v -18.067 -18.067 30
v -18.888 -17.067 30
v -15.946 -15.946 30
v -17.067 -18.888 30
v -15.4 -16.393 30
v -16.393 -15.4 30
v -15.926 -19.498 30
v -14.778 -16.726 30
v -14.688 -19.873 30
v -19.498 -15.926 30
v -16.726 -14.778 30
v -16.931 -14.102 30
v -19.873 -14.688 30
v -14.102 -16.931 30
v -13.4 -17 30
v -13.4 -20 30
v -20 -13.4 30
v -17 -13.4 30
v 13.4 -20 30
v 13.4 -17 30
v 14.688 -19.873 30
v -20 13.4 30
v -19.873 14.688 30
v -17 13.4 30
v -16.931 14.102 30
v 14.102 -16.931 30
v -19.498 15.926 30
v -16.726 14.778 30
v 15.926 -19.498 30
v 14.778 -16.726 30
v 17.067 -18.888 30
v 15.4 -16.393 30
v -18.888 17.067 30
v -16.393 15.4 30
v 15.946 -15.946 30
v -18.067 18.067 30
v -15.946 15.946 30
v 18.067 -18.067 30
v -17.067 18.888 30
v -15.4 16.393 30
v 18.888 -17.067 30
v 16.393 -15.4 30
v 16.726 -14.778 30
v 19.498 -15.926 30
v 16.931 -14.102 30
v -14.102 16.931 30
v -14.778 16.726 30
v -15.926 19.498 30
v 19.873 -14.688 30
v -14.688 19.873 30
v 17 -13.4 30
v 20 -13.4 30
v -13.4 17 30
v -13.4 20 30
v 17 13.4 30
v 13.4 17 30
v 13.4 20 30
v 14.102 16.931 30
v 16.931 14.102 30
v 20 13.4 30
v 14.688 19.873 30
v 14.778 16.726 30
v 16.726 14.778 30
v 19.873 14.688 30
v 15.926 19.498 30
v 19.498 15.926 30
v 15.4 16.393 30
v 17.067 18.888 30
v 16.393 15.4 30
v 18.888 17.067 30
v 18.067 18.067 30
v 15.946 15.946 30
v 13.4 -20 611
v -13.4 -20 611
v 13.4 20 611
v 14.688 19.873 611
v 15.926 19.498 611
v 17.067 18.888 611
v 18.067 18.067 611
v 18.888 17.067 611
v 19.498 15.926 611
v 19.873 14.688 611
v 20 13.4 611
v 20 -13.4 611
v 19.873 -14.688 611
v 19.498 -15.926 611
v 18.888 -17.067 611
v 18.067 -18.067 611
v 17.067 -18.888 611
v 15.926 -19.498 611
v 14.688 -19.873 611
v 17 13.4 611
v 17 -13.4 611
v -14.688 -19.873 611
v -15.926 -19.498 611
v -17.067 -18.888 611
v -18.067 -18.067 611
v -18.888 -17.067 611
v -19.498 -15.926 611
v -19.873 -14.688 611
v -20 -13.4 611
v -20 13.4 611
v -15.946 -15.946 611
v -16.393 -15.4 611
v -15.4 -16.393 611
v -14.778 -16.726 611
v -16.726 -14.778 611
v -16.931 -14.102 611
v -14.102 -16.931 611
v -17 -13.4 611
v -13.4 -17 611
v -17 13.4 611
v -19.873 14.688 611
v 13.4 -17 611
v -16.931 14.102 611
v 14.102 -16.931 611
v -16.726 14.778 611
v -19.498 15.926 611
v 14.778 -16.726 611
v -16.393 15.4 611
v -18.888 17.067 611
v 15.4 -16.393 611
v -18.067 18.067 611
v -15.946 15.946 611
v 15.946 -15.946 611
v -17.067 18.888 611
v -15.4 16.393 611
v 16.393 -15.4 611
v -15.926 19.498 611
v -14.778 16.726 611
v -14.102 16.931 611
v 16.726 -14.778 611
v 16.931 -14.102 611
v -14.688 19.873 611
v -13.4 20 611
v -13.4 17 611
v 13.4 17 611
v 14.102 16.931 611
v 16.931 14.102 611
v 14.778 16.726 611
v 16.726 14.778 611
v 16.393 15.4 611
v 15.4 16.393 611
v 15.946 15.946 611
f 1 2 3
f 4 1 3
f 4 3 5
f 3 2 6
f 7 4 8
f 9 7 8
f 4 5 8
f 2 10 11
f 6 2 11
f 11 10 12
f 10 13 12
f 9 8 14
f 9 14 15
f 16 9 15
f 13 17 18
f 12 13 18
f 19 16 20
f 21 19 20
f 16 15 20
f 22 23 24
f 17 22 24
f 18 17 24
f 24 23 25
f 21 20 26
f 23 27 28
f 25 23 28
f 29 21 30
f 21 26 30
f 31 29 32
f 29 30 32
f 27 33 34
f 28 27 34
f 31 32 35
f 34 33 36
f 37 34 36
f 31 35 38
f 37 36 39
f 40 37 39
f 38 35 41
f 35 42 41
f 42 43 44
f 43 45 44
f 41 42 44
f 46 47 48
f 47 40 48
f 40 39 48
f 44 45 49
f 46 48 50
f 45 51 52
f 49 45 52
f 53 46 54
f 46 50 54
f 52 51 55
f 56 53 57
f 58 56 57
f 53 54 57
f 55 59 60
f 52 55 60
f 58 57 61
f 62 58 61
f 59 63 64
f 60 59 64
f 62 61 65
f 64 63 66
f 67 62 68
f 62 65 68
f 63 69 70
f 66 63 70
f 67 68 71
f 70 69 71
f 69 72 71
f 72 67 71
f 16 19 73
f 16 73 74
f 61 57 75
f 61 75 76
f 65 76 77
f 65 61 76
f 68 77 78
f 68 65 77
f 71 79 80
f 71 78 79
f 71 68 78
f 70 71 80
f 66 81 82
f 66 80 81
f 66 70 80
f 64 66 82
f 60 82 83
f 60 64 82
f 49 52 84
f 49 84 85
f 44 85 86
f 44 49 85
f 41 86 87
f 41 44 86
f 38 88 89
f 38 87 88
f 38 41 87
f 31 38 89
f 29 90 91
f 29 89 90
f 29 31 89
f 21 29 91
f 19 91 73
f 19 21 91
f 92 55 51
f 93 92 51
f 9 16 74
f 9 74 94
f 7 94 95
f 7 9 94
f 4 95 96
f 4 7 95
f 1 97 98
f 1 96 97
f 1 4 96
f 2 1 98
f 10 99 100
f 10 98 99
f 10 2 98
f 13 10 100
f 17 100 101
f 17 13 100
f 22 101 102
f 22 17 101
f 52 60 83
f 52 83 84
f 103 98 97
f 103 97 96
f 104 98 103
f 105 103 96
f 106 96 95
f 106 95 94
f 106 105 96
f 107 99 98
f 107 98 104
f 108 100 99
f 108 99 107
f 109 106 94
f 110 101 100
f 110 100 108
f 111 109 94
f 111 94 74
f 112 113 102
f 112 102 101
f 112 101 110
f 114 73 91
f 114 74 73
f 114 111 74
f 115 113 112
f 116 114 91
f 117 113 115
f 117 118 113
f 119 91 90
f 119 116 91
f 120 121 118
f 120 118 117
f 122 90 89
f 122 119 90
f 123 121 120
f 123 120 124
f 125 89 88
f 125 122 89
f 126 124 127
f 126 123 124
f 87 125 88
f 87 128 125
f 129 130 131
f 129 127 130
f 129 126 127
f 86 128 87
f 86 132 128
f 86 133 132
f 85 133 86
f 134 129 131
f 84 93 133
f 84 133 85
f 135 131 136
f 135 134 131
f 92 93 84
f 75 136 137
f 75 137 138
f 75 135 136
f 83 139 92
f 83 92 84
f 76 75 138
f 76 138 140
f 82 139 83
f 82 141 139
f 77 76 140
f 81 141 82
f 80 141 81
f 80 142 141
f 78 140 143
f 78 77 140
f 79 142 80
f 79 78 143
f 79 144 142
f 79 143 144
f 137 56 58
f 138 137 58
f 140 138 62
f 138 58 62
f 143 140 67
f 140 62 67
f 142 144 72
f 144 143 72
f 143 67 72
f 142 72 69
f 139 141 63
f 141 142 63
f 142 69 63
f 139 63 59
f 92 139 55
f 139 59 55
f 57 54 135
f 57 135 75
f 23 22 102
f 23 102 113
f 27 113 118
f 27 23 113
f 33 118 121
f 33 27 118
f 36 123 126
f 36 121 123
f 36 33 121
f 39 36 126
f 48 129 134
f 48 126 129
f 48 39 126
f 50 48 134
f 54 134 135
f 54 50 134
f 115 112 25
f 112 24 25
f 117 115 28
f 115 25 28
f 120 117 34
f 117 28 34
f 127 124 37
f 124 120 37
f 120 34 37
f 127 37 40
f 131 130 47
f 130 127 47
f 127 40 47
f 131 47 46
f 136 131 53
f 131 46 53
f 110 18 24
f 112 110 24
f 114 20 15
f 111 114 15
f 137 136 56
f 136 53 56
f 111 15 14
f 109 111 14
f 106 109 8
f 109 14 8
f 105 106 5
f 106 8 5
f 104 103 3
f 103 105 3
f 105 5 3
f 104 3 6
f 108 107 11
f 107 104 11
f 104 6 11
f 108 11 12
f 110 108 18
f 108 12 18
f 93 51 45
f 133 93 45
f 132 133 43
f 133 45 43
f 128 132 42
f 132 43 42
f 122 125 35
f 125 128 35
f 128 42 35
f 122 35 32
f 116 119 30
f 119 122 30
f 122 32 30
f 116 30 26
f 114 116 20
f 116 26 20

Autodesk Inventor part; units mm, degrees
ref_plane "Start plane" through (0, 0, 30) normal (0, 0, 1) x (1, 0, 0)
ref_plane "End plane" through (0, 0, 611) normal (0, 0, 1) x (1, 0, 0)
sketch "Sketch" plane through (0, 0, 0) normal (0, 0, 1) x (1, 0, 0)
  line L0 (-20, -13.4) -> (-20, 13.4)
  line L1 (-13.4, 20) -> (13.4, 20)
  line L2 (20, 13.4) -> (20, -13.4)
  line L3 (13.4, -20) -> (-13.4, -20)
  arc A0 (-20, -13.4) -> (-13.4, -20) centre (-13.4, -13.4) ccw
  arc A1 (-13.4, 20) -> (-20, 13.4) centre (-13.4, 13.4) ccw
  arc A2 (20, 13.4) -> (13.4, 20) centre (13.4, 13.4) ccw
  arc A3 (13.4, -20) -> (20, -13.4) centre (13.4, -13.4) ccw
  arc A4 (-13.4, 17) -> (-17, 13.4) centre (-13.4, 13.4) ccw
  line L4 (-13.4, 17) -> (13.4, 17)
  arc A5 (17, 13.4) -> (13.4, 17) centre (13.4, 13.4) ccw
  line L5 (17, 13.4) -> (17, -13.4)
  arc A6 (13.4, -17) -> (17, -13.4) centre (13.4, -13.4) ccw
  line L6 (13.4, -17) -> (-13.4, -17)
  arc A7 (-17, -13.4) -> (-13.4, -17) centre (-13.4, -13.4) ccw
  line L7 (-17, -13.4) -> (-17, 13.4)
  line L8 (0, 22.0873) -> (0, -22.0873) construction
  line L9 (-22.0873, 0) -> (22.0873, 0) construction
  dimension "d7" = 6.6
  dimension "d10" = 40
  dimension "d11" = 40
  dimension "d12" = 3
  dimension "d15" = 20
  dimension "d16" = 20
extrude "Body" add sketch "Sketch" along normal up to surface (581 mm away) from surface at 30
sketch "Sketch3" plane through (0, 0, 0) normal (0, 0, 1) x (1, 0, 0)
  line L0 (0, 0) -> (10, 0)
ref_plane "Work Plane3" through (0, 0, 0) normal (0, -1, 0) x (1, 0, 0)
sketch "Sketch4" plane through (0, 0, 0) normal (0, -1, 0) x (1, 0, 0)
  line L0 (-2, 30) -> (12, 30)
  line L1 (-2, 611) -> (12, 611)
  dimension "d18" = 581
ref_plane "Work Plane5" through (340.8, 45, 30) normal (0, 0, -1) x (-1, 0, 0)
split "Split2" plane through (340.8, 45, 30) removes the side toward (0, 0, -1)
ref_plane "Work Plane6" through (385, -18.4, 611) normal (0, 0, 1) x (1, 0, 0)
split "Split3" plane through (385, -18.4, 611) removes the side toward (0, 0, 1)
equation "\"d7\" = G_IR"
equation "\"d10\" = G_H"
equation "\"d11\" = G_W"
equation "\"d12\" = G_T"
equation "\"d15\" = 0.5 * d10"
equation "\"d16\" = 0.5 * d11"
equation "\"d3\" = G_L"
equation "\"G_W\" = 40"
equation "\"G_H\" = 40"
equation "\"G_T\" = 3"
equation "\"G_IR\" = 6.6"
equation "\"G_L\" = d18"
equation "\"d14\" = G_OFFSET_END + B_L"
equation "\"B_L\" = 651"
equation "\"G_OFFSET_END\" = -40"
properties part number "DIN EN 10305-5 - 40 x 40 x 3  - 581" material "Steel, Mild"
